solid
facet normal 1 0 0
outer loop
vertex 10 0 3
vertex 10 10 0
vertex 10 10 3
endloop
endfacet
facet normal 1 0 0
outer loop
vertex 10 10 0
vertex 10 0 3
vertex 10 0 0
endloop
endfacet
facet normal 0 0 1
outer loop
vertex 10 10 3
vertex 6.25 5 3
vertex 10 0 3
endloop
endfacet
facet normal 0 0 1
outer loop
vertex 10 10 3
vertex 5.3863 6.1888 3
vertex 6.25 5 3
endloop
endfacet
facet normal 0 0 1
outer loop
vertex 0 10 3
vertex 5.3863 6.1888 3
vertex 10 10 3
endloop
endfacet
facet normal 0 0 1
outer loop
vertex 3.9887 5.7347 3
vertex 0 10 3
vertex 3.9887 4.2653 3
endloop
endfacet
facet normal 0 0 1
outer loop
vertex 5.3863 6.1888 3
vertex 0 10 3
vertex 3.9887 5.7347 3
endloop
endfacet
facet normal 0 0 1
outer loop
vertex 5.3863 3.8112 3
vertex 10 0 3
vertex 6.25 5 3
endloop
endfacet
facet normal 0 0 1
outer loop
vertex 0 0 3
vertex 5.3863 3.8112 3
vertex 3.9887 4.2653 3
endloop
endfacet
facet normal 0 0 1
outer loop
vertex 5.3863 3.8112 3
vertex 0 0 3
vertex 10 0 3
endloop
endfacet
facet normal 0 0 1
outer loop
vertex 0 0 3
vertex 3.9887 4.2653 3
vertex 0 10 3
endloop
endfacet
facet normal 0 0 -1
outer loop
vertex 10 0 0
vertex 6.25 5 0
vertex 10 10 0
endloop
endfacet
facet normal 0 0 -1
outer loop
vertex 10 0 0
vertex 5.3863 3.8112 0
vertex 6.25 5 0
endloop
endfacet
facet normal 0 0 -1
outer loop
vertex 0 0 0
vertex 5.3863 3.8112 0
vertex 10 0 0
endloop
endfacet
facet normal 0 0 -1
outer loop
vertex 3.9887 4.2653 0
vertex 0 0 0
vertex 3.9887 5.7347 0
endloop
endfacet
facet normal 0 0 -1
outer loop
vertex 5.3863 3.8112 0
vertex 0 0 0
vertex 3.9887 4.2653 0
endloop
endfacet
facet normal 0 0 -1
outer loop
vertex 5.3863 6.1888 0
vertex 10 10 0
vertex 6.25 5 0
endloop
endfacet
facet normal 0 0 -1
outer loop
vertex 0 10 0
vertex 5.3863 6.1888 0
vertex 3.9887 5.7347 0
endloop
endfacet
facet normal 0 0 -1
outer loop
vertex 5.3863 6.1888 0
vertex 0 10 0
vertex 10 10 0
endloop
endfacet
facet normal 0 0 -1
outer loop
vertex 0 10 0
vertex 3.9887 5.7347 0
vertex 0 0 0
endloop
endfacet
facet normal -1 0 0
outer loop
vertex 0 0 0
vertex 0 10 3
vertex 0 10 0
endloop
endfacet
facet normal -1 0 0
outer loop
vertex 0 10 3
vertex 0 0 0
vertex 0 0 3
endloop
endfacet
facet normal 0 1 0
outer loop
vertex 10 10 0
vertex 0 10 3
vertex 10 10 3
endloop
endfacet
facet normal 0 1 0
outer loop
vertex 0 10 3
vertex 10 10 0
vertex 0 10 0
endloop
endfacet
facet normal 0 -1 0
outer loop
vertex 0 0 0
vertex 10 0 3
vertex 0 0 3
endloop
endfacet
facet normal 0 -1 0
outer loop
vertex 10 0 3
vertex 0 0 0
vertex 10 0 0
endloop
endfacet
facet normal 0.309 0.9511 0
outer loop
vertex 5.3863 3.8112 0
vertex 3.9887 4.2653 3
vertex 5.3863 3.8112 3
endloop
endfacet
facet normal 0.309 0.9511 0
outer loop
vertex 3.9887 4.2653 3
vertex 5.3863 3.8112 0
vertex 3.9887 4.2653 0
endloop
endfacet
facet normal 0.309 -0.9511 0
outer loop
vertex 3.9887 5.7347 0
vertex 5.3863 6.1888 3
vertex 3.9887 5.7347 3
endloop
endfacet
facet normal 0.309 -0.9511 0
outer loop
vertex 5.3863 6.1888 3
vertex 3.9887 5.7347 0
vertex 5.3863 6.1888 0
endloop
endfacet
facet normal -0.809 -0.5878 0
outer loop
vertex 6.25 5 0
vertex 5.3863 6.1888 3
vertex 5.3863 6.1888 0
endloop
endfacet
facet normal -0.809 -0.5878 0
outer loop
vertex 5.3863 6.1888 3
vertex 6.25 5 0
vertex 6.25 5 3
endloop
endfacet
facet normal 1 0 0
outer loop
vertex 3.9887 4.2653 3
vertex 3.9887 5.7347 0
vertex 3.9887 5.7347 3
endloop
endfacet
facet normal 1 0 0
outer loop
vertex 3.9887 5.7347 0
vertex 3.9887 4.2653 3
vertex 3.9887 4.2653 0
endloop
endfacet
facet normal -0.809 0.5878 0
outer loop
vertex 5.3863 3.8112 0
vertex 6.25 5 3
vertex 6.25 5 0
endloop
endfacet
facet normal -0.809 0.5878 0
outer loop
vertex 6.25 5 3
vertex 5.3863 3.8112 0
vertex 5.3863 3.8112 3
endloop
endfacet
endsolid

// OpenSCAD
blockWidth = 10;
blockHeight = 3;
screwDiameter = 2.5;

difference(){
	cube([blockWidth,blockWidth,blockHeight]);
	translate([blockWidth/2,blockWidth/2,-1]) cylinder(d=screwDiameter, h=blockHeight+2);
}
